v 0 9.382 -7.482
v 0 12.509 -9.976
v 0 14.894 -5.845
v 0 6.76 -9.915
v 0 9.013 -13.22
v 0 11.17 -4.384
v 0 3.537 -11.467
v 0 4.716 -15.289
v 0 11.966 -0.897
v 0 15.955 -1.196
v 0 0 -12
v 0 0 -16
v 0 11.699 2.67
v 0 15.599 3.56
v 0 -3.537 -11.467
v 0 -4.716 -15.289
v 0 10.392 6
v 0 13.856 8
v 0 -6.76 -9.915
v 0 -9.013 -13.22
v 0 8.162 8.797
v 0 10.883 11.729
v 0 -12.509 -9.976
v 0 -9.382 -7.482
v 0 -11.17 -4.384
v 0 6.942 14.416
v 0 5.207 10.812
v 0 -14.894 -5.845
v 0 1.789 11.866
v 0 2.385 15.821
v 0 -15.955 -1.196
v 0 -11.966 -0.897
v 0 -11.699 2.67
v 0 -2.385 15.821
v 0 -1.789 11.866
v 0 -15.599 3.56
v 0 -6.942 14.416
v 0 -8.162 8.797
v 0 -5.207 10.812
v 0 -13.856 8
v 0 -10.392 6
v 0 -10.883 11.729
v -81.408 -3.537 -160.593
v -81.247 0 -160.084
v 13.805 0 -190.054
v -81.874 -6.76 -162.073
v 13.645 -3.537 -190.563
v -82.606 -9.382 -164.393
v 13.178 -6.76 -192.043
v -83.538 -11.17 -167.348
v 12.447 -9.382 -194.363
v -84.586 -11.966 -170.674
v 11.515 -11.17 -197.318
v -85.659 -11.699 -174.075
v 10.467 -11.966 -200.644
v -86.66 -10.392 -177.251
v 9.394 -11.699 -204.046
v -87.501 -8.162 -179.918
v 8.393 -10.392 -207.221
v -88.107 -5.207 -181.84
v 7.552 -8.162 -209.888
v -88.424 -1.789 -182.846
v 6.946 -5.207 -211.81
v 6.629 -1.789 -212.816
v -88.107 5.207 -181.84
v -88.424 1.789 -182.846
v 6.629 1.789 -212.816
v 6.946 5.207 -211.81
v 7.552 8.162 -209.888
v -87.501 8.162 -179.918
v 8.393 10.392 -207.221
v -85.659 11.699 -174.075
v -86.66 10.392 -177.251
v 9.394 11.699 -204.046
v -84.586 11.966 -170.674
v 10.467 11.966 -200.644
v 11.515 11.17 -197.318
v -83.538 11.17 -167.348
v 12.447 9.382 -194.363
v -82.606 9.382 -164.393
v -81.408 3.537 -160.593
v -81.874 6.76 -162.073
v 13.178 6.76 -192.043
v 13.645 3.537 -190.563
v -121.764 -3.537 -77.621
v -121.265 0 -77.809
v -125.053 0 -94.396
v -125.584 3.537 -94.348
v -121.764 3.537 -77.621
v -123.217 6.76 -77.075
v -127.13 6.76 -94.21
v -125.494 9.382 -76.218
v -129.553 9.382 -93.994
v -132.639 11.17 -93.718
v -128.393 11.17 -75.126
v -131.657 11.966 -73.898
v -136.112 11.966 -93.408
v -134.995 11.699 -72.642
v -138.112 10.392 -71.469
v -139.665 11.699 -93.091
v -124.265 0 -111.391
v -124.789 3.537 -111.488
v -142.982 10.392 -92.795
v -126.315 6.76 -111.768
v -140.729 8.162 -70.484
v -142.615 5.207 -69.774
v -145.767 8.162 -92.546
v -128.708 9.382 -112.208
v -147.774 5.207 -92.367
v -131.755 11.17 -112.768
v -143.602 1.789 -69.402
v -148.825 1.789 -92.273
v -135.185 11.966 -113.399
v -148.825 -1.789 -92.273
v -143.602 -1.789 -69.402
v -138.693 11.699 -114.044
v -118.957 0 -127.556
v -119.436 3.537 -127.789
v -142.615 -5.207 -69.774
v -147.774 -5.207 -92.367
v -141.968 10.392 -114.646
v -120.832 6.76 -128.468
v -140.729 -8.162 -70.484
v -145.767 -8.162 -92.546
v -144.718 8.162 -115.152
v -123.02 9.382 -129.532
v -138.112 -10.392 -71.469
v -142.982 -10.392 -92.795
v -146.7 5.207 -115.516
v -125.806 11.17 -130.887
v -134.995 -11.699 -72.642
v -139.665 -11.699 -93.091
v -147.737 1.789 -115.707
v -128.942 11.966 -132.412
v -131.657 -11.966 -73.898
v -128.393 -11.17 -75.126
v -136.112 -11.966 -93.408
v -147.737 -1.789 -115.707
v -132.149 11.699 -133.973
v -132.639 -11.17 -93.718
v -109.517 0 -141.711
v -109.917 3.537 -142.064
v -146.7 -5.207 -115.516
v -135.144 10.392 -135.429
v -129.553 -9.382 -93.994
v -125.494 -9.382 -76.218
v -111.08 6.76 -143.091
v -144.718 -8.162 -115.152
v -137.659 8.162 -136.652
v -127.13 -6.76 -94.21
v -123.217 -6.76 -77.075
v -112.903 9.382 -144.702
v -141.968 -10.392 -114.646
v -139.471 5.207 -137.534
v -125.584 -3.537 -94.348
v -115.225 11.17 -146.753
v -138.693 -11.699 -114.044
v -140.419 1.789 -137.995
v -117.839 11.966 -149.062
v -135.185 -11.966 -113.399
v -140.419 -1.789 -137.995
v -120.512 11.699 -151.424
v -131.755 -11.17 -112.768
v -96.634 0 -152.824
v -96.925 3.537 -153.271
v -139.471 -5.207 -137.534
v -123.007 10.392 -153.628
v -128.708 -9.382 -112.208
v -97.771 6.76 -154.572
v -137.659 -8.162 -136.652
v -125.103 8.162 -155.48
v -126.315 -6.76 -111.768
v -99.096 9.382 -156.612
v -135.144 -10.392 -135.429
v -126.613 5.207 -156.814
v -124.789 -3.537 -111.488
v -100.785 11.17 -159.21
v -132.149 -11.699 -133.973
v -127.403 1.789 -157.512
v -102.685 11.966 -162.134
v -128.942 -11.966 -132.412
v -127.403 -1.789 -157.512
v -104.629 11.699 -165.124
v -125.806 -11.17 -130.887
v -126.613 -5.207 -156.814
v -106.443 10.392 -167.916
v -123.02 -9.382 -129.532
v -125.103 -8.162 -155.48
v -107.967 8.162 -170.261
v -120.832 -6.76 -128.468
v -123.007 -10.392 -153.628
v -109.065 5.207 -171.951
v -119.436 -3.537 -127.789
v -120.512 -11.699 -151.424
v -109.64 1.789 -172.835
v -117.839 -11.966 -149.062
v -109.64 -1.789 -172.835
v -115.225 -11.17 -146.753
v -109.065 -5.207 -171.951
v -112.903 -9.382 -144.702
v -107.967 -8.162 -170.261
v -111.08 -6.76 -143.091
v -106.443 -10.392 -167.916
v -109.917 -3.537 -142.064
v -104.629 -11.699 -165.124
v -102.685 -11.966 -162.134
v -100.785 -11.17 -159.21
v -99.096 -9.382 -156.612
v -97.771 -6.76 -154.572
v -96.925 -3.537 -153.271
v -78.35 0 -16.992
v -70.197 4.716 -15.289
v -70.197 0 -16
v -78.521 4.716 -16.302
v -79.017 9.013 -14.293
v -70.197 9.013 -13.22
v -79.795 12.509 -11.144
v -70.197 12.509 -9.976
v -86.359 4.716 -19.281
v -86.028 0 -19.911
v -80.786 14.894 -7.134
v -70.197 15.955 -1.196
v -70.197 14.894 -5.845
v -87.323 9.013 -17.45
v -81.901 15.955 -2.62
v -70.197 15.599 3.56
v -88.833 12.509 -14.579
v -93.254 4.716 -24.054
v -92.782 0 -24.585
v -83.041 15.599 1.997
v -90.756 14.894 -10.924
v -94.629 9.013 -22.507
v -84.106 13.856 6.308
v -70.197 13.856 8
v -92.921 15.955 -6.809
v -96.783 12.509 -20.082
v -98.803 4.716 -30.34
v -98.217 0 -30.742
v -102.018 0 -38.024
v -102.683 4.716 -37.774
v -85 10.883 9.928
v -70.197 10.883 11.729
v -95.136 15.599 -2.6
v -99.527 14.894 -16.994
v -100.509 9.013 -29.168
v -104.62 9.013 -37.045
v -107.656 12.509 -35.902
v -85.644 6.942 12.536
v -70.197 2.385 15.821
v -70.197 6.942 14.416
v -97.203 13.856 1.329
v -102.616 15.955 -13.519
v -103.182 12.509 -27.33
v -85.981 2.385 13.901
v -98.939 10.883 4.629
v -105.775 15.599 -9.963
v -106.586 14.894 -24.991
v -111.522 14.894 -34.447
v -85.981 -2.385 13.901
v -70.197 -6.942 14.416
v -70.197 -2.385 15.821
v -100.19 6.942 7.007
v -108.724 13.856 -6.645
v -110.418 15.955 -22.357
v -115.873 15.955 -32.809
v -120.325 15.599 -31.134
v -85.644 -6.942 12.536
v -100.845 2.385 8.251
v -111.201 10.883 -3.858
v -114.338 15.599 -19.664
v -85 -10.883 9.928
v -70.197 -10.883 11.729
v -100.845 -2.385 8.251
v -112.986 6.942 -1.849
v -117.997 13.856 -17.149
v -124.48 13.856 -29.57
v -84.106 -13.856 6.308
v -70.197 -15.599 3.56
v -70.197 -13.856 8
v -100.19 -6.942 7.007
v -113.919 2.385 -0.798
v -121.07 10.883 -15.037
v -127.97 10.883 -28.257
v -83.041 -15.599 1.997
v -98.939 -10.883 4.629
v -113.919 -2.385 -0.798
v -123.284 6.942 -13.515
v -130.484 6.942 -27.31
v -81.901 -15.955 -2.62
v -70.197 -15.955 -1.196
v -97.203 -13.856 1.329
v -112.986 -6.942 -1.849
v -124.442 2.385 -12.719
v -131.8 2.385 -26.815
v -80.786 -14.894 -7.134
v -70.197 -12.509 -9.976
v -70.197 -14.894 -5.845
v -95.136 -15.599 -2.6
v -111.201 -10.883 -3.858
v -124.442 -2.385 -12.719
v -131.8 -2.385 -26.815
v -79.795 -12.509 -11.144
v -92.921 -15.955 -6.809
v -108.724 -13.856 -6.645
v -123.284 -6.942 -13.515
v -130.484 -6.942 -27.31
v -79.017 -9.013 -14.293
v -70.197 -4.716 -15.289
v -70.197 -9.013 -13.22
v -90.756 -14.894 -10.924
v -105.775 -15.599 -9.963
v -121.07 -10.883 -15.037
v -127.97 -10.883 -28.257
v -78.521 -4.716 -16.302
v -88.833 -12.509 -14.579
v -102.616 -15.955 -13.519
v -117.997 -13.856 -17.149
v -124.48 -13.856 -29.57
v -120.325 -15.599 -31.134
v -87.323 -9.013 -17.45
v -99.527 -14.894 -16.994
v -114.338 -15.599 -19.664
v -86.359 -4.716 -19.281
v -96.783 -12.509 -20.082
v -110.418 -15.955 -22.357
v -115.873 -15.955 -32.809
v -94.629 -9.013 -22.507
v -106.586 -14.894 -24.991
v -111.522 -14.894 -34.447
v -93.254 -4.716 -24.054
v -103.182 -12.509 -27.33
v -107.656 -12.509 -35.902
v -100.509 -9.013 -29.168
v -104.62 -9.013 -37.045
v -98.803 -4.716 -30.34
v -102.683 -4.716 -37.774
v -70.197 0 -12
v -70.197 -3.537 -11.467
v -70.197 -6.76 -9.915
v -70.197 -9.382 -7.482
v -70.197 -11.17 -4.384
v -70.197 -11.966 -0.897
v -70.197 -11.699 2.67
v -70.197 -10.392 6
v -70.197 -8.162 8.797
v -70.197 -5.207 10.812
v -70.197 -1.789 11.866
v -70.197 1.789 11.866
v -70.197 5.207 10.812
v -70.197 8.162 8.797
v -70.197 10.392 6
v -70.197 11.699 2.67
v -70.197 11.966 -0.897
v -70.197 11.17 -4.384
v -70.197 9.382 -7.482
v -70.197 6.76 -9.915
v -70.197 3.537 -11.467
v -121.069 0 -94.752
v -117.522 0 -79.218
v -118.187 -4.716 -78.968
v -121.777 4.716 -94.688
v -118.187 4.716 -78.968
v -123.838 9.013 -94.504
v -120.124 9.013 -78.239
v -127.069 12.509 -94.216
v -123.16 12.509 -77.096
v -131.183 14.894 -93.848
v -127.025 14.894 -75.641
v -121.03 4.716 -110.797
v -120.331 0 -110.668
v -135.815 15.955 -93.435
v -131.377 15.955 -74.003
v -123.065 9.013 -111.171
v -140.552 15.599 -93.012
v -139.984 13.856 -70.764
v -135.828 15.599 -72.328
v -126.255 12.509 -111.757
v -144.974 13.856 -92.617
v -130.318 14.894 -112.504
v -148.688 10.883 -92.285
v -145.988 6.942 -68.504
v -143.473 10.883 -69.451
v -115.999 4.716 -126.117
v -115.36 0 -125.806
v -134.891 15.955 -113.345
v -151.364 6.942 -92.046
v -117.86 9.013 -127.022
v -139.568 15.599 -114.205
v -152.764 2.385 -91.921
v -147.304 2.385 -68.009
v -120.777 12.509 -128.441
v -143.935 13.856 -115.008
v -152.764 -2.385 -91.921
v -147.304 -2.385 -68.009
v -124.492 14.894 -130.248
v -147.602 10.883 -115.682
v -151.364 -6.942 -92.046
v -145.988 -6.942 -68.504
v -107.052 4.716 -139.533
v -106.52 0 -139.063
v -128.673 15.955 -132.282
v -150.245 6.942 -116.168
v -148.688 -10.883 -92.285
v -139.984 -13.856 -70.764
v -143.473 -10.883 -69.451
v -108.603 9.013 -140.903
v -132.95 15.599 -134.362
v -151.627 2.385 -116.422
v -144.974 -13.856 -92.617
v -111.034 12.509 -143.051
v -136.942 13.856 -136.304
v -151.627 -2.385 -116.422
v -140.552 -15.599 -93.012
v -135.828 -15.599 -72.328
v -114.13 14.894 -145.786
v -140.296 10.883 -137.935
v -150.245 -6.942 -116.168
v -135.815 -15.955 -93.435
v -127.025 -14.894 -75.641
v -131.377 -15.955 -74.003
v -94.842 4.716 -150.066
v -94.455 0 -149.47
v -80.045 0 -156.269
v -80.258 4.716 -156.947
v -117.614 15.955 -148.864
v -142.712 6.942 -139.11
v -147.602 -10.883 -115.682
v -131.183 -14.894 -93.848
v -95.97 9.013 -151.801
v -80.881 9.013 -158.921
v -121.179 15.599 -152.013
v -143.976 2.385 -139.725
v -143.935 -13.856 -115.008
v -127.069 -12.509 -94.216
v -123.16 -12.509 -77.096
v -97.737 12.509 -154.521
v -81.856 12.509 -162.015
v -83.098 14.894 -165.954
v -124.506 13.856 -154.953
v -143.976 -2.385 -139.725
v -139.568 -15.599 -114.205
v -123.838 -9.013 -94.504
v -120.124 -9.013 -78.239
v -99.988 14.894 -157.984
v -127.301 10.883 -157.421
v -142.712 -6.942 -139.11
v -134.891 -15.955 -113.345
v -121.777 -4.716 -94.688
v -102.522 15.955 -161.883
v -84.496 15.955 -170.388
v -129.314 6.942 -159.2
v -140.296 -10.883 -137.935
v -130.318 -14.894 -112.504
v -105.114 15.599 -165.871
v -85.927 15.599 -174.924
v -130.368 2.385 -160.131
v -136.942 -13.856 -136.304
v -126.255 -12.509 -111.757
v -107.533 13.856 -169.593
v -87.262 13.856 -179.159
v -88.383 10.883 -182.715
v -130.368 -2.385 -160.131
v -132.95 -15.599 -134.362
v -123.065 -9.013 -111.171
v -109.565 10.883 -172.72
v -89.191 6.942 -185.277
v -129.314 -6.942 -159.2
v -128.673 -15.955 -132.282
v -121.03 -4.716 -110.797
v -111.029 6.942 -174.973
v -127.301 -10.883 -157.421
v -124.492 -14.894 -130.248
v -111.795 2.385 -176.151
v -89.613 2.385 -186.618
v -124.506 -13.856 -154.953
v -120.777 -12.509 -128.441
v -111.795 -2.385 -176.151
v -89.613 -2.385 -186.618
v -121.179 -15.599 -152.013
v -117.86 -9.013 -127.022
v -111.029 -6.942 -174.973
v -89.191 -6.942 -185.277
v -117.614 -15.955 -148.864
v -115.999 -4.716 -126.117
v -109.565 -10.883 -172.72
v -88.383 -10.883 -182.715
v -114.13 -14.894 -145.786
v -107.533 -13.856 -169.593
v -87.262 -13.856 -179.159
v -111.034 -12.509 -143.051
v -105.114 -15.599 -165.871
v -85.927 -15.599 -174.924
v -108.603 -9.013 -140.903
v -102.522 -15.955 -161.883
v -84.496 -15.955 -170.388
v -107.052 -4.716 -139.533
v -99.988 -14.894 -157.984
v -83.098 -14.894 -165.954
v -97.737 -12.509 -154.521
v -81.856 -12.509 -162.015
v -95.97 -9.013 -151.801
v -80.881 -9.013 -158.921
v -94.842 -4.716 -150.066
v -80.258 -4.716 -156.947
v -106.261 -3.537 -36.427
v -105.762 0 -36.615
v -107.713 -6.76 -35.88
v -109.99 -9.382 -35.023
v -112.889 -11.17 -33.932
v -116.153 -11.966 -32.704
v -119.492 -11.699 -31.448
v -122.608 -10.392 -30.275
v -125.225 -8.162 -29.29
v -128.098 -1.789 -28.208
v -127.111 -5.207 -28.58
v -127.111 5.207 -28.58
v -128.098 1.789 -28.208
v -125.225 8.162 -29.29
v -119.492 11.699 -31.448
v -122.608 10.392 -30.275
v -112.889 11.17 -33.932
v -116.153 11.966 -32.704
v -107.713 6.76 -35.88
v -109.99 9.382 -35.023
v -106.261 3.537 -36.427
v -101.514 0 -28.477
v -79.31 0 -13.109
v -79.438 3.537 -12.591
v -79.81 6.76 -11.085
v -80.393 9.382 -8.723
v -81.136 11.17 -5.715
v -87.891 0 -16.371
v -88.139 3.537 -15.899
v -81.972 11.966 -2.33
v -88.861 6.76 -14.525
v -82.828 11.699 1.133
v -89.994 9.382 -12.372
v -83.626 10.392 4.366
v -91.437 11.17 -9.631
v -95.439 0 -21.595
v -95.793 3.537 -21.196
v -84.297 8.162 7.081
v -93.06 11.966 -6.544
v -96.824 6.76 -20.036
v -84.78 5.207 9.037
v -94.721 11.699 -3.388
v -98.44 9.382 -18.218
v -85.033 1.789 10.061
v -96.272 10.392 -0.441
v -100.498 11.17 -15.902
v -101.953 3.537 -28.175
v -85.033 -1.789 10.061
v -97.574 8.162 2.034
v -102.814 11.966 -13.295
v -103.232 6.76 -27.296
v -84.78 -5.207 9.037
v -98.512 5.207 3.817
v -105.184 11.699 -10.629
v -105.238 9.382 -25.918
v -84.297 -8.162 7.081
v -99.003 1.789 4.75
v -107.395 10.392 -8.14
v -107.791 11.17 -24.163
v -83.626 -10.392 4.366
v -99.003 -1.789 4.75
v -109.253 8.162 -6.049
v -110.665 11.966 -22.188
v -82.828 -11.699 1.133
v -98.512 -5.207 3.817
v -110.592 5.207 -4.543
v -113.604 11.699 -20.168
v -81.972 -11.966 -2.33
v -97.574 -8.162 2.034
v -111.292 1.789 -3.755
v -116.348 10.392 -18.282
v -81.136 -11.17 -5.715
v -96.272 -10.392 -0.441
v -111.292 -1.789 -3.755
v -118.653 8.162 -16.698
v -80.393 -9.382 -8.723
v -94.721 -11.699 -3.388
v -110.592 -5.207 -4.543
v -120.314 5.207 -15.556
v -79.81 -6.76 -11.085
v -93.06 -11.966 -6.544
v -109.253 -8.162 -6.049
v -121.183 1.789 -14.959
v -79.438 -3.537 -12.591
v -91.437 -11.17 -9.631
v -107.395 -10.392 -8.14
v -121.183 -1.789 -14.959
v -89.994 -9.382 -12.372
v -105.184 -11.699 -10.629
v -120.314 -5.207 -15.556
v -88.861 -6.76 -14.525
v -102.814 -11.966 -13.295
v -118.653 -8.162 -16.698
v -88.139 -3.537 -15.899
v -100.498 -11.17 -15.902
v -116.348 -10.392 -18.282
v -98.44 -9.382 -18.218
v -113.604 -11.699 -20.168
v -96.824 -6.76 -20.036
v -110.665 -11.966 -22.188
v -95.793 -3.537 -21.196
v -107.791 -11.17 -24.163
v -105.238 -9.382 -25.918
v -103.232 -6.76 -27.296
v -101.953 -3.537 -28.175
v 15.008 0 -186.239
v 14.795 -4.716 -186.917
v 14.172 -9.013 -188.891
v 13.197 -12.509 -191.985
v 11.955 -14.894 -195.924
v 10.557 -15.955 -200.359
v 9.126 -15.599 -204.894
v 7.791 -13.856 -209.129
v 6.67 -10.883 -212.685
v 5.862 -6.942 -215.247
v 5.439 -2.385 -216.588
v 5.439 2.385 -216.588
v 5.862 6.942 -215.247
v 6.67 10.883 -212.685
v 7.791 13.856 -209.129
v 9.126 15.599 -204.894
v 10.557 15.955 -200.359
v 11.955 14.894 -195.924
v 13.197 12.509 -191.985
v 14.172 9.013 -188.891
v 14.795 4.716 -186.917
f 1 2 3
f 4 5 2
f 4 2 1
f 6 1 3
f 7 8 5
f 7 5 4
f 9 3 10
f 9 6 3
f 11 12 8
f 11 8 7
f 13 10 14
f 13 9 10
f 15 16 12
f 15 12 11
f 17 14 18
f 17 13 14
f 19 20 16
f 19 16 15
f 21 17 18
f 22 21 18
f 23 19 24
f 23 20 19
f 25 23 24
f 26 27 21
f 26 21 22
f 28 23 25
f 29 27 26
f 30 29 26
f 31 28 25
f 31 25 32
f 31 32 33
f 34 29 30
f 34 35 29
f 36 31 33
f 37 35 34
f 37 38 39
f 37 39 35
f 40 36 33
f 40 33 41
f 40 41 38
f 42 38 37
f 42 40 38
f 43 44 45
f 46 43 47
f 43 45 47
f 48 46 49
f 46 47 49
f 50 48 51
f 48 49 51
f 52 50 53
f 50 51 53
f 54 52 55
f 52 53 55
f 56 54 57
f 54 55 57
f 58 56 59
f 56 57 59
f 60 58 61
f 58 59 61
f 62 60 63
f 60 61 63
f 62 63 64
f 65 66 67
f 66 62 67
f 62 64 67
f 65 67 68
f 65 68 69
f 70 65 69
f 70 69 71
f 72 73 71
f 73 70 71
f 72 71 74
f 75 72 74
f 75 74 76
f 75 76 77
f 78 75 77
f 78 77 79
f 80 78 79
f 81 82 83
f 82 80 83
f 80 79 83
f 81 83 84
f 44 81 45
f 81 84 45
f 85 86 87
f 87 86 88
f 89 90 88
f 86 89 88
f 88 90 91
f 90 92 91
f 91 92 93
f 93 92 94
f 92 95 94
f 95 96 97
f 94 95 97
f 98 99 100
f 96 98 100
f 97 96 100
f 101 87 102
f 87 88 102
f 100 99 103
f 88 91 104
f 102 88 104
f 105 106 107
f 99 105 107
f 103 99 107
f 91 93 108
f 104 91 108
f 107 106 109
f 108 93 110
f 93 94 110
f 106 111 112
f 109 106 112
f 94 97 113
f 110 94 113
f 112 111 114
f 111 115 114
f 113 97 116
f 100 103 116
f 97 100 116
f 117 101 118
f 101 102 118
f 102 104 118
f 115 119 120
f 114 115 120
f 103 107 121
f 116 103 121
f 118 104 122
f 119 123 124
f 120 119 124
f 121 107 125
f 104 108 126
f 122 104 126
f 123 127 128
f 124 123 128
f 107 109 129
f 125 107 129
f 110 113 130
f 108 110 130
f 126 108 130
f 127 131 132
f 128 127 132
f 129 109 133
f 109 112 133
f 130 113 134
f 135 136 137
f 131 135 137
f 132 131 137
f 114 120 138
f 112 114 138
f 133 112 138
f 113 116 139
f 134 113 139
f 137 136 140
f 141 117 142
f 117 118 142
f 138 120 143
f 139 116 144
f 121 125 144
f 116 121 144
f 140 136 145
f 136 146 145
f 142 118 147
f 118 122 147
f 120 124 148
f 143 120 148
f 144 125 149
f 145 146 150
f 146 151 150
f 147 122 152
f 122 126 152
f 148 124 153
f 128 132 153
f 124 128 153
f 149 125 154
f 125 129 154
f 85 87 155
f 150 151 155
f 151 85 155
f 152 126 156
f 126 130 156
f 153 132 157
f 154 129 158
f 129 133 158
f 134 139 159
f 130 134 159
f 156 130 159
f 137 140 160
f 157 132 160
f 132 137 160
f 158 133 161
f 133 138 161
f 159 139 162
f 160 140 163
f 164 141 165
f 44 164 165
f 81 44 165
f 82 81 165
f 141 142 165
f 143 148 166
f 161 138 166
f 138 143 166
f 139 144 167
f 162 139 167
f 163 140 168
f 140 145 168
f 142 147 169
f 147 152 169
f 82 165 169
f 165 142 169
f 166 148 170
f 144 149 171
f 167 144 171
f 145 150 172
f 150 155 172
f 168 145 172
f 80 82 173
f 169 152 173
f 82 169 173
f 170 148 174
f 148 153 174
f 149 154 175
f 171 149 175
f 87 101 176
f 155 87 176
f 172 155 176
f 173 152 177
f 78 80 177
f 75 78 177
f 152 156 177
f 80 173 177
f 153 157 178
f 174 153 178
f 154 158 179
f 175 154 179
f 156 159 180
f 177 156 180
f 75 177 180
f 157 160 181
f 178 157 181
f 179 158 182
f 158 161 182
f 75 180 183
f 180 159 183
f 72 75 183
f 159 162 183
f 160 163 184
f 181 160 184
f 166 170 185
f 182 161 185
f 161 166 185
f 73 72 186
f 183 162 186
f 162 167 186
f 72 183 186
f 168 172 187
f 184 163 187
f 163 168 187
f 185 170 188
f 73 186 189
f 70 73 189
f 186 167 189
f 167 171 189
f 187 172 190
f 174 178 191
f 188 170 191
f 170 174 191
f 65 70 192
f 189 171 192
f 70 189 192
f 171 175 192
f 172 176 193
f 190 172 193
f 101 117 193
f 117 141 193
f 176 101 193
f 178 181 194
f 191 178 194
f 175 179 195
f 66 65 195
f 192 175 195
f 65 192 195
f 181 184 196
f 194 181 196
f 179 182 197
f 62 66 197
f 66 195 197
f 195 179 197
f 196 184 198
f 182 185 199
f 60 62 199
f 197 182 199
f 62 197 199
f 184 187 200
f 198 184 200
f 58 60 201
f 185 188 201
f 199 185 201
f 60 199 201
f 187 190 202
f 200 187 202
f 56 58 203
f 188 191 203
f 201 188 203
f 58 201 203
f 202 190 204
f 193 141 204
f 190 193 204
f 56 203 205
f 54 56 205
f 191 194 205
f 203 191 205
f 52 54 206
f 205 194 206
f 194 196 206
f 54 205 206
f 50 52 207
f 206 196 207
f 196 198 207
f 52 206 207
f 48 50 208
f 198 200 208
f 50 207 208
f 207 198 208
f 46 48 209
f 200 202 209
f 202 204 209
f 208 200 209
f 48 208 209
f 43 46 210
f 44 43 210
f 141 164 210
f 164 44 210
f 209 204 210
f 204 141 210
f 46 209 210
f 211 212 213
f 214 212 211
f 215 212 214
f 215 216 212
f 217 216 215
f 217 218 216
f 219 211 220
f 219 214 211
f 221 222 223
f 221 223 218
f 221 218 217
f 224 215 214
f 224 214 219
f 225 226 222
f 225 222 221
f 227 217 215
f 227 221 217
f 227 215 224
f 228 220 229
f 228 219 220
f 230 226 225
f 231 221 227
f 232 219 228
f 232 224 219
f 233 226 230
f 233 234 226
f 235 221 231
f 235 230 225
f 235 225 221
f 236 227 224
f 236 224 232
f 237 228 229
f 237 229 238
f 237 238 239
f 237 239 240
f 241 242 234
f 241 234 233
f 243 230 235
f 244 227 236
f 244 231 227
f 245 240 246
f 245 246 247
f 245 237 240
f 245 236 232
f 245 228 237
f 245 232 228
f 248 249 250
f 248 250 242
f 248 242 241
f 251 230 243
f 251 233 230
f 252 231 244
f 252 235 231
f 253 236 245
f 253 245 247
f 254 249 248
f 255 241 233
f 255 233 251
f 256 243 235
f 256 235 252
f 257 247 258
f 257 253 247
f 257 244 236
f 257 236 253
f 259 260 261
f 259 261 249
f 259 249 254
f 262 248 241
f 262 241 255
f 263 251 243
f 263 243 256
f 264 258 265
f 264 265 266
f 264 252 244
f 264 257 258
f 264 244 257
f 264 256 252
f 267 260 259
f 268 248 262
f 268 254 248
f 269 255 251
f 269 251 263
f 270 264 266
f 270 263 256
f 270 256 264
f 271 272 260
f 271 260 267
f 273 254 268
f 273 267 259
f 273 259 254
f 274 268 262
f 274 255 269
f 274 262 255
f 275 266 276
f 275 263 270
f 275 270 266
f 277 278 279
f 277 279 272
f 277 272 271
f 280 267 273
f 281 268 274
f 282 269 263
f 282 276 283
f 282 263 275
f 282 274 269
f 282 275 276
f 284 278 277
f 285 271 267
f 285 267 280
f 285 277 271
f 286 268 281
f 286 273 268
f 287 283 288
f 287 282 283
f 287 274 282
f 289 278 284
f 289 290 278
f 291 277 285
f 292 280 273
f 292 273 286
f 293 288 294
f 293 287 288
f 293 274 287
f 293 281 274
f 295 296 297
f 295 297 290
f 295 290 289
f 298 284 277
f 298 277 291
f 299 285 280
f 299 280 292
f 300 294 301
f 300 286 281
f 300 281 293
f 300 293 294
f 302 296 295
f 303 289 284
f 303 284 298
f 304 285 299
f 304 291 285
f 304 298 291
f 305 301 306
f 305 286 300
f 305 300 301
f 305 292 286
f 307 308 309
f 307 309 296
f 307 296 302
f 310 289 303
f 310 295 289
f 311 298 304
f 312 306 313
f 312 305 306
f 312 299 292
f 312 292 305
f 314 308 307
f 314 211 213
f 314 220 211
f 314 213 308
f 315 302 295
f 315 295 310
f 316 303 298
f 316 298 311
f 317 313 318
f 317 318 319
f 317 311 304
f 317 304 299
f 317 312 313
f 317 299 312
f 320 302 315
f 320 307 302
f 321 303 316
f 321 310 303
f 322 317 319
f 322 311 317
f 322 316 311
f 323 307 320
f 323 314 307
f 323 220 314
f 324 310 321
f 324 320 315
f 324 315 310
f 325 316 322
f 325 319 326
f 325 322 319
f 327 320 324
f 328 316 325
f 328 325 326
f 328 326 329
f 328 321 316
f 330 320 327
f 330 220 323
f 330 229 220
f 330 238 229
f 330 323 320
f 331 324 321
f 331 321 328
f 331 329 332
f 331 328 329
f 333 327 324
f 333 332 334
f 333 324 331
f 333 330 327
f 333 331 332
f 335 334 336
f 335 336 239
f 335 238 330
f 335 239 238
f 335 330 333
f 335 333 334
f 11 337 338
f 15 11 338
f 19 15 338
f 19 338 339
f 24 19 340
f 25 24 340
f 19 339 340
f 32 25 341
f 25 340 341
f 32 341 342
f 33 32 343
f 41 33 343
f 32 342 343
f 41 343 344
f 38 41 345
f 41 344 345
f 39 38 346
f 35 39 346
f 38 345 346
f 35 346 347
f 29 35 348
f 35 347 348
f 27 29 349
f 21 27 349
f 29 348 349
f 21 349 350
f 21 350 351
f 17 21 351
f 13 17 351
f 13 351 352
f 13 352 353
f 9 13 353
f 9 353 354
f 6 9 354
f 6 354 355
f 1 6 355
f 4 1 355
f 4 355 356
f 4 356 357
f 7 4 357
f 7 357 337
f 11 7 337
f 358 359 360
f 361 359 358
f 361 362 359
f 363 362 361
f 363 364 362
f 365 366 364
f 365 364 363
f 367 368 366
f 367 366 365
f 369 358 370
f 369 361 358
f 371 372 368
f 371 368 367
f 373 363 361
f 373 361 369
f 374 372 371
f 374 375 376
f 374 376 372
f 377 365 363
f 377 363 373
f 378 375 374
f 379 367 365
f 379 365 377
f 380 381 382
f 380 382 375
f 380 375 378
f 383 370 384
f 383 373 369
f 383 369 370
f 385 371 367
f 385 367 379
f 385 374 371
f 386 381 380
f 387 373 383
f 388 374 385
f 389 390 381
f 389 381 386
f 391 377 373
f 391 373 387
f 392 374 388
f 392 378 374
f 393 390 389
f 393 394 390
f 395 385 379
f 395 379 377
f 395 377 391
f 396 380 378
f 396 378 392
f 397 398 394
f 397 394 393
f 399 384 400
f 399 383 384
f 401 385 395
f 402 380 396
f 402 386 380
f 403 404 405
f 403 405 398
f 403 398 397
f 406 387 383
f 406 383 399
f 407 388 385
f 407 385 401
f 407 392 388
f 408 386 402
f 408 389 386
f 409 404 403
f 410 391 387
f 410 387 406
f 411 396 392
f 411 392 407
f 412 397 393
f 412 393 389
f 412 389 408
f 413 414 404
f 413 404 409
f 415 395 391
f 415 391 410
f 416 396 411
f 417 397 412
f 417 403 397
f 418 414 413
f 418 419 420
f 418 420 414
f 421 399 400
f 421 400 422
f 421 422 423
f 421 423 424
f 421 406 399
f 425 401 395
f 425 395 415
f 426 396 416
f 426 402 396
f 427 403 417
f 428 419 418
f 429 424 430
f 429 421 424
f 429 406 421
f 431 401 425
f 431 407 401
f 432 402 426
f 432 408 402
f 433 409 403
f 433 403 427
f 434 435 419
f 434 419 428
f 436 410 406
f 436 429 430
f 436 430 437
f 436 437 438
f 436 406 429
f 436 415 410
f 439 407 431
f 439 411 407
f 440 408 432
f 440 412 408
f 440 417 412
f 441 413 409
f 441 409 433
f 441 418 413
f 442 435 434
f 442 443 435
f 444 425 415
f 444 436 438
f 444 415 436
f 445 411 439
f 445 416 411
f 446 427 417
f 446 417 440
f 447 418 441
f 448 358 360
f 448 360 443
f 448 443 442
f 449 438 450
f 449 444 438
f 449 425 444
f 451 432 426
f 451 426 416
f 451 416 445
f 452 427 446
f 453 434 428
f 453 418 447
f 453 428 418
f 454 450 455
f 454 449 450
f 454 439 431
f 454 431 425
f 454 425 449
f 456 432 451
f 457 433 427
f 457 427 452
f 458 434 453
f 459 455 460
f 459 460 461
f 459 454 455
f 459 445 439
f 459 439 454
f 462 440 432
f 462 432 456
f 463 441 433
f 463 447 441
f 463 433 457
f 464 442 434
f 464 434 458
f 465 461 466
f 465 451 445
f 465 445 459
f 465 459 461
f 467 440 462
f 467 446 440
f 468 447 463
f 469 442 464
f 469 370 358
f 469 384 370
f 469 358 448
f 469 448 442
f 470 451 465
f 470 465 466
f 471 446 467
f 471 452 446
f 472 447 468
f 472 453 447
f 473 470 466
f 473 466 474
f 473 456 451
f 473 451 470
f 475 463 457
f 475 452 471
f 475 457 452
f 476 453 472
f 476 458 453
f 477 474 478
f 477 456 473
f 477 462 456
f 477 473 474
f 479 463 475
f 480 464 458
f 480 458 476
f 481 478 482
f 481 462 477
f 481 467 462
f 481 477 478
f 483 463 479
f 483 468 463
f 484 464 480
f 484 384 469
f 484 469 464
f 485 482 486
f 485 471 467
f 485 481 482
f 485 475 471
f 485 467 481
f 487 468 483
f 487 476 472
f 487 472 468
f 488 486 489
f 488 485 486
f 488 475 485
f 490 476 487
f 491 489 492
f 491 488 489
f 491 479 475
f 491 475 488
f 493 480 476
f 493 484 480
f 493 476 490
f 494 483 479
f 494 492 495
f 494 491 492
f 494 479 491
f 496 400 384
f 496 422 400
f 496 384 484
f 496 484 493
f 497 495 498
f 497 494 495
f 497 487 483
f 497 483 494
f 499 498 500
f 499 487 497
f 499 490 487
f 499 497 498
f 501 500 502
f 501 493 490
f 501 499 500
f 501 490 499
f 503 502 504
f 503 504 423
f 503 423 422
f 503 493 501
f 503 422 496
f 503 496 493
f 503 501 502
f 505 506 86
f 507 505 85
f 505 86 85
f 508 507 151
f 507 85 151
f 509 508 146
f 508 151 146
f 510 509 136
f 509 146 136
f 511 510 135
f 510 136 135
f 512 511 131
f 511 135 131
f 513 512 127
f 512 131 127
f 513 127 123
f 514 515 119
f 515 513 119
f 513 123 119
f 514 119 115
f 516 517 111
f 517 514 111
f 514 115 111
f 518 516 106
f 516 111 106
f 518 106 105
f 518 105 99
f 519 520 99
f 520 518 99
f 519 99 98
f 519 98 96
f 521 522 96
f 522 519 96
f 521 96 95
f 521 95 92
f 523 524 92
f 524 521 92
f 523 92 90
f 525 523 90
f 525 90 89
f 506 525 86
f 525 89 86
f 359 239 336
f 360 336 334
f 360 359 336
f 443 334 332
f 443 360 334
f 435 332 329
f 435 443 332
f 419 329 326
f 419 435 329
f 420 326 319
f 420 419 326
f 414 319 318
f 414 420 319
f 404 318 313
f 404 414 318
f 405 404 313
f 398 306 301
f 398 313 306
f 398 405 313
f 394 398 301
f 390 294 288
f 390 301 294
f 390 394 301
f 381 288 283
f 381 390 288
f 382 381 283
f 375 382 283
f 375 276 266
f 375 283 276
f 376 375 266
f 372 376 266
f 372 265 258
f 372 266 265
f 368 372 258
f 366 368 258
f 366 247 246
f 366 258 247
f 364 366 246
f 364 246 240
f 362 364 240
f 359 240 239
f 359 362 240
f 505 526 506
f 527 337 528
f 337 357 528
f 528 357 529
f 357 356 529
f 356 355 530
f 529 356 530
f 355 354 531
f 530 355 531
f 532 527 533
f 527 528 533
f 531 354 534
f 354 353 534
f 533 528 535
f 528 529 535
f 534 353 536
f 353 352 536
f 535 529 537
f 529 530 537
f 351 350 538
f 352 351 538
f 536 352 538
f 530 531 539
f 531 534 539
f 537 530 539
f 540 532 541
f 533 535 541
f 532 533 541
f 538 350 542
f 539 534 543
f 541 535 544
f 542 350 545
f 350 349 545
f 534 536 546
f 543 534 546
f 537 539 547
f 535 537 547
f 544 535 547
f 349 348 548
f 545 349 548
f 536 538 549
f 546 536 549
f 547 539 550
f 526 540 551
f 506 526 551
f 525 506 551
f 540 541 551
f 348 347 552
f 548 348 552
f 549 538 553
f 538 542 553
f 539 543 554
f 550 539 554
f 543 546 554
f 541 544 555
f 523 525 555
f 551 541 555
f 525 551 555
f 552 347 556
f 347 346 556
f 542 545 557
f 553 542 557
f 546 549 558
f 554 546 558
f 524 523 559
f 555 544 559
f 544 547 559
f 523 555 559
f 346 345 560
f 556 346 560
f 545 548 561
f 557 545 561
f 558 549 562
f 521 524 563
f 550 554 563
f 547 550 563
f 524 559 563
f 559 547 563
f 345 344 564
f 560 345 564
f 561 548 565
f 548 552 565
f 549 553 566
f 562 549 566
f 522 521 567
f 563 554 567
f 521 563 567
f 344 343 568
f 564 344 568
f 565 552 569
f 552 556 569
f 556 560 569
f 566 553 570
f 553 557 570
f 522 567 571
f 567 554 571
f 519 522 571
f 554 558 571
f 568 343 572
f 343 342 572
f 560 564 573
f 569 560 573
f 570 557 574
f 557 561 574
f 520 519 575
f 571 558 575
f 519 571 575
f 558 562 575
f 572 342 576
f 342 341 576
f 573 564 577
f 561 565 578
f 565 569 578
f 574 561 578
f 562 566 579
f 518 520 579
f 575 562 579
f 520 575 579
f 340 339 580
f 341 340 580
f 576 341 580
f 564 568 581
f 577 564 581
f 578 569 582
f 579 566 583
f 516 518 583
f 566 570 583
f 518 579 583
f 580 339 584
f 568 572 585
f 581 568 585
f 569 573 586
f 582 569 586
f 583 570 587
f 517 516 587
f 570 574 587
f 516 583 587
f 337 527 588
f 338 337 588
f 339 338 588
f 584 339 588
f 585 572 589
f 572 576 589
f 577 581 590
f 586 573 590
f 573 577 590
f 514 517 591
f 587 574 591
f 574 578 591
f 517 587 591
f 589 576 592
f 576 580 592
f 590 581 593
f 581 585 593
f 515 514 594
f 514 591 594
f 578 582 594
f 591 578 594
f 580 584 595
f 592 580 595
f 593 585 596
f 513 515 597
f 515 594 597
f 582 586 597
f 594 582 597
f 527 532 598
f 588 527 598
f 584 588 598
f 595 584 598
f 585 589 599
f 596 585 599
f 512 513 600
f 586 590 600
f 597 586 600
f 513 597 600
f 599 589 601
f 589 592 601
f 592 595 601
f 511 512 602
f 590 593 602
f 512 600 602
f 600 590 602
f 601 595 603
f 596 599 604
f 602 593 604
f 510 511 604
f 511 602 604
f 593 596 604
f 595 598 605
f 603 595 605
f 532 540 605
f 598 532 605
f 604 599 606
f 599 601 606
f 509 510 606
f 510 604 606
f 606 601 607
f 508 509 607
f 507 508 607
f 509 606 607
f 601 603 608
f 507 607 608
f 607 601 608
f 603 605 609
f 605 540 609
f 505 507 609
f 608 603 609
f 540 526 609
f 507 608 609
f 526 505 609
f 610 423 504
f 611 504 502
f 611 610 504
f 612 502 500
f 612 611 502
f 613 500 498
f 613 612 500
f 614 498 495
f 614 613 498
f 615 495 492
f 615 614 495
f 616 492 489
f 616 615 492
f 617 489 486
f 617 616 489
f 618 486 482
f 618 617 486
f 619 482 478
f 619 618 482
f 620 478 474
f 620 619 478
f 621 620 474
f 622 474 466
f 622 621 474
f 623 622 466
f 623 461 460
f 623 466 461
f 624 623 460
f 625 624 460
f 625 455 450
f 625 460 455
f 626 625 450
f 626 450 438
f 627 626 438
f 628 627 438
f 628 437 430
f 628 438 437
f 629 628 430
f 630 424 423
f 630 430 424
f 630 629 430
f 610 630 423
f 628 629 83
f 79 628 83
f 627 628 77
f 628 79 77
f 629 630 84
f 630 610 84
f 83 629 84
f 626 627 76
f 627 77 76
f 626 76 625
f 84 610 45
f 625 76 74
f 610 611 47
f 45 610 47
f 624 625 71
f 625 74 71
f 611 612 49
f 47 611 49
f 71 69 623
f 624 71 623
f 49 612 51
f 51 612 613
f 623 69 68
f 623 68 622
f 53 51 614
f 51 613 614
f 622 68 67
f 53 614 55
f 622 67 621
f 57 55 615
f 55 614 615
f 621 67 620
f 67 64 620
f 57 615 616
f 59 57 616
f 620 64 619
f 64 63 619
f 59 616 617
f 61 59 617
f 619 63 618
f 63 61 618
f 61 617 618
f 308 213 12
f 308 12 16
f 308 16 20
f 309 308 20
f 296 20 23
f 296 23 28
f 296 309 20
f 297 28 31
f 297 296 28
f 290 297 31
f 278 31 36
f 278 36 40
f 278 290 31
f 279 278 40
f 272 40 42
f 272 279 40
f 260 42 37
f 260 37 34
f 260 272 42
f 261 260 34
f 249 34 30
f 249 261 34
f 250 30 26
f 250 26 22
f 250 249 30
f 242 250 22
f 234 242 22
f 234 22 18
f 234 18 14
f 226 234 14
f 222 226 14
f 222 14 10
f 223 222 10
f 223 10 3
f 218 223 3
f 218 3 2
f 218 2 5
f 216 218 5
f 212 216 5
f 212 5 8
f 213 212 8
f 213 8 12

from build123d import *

# Parameters (mm, degrees)
SKETCH2_R   = 16
SKETCH2_R_2 = 12


with BuildPart() as part:
    # Sweep1: sweep along a path in Sketch1
    with BuildLine(Plane(origin=(0, 0, 0), x_dir=(1, 0, 0), z_dir=(0, 1, 0))) as sweep1_path:
        Line((0, 0), (-70.1970105, 0))
        ThreePointArc((-70.1970105, 0), (-98.652281007, 8.886771224), (-116.99253235, 32.388096786))
        Line((-116.99253235, 32.388096786), (-132.496272122, 73.582145179))
        ThreePointArc((-132.496272122, 73.582145179), (-129.748156844, 132.804715841), (-84.855924311, 171.528771306))
        Line((-84.855924311, 171.528771306), (10.197010652, 201.498846579))
    # Sketch2 → Sweep1 (sweep)
    with BuildSketch(Plane(origin=(0, 0, 0), x_dir=(0, 0, -1), z_dir=(1, 0, 0))):
        Circle(SKETCH2_R)
        Circle(SKETCH2_R_2, mode=Mode.SUBTRACT)
    sweep(path=sweep1_path.line)


solid = part.part
